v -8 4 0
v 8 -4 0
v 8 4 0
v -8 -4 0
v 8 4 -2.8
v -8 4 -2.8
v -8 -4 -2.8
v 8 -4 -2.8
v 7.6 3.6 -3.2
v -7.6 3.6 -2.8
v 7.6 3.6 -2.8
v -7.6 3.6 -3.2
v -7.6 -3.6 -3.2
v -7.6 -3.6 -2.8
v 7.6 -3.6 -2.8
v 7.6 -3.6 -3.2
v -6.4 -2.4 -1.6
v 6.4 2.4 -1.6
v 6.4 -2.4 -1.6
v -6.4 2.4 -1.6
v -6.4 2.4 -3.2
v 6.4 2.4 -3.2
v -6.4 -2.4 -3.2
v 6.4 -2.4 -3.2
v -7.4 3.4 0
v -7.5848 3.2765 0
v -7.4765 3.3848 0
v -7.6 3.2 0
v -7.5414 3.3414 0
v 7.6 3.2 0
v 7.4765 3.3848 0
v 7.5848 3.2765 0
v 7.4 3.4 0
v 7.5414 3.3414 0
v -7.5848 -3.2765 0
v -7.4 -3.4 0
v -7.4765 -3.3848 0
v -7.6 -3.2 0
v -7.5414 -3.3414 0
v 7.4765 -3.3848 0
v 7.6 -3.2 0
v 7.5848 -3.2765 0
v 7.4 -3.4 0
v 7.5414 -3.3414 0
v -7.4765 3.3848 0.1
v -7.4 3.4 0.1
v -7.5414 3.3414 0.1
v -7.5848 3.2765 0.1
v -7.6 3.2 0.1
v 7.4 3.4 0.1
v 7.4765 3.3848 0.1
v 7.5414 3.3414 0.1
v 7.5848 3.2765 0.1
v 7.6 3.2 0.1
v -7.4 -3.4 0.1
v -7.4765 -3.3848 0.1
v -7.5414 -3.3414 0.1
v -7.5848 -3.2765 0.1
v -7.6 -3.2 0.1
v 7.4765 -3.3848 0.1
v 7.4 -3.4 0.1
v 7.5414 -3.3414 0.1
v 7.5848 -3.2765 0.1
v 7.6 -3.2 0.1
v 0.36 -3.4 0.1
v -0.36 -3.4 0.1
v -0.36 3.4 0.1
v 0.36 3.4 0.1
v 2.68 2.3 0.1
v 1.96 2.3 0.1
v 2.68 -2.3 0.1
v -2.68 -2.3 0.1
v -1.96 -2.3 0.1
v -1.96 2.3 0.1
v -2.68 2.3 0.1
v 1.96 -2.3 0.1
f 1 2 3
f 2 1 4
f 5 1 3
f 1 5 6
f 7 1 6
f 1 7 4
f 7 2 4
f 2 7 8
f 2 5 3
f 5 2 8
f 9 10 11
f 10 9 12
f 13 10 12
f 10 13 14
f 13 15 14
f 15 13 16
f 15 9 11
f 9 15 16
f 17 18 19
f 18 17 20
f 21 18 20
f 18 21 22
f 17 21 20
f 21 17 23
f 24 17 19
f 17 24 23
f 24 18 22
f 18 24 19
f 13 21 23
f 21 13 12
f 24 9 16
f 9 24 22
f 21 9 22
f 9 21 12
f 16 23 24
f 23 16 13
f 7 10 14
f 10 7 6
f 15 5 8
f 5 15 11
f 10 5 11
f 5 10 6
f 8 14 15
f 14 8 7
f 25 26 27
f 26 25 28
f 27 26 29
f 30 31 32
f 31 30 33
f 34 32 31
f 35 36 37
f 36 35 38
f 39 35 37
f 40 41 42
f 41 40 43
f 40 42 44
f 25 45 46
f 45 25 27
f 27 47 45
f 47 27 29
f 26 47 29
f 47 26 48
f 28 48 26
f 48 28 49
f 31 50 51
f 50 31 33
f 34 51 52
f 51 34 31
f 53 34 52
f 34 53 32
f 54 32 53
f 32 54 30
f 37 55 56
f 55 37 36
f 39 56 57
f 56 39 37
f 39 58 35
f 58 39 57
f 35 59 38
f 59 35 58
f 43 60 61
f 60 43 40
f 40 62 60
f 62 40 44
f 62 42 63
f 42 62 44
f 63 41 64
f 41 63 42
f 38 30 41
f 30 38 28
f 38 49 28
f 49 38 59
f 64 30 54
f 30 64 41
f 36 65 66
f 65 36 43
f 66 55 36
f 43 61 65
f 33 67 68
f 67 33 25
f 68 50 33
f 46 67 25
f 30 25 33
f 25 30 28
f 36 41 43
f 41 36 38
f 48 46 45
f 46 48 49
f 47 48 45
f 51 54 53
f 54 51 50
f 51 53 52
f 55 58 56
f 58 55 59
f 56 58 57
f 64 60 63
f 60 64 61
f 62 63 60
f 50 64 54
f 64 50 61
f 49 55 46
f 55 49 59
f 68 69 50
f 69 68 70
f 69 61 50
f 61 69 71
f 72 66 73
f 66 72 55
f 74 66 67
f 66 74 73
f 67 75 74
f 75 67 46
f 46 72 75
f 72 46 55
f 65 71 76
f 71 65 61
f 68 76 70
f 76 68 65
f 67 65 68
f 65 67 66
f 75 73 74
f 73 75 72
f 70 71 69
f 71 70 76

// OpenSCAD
// file: ../p/box5.scad
use <../lib.scad>
function ldraw_lib__box5() = [
// 0 Box with 5 Faces and All Edges
// 0 Name: box5.dat
// 0 Author: James Jessiman
// 0 !LDRAW_ORG Primitive UPDATE 2012-01
// 0 !LICENSE Licensed under CC BY 4.0 : see CAreadme.txt
// 
// 0 BFC CERTIFY CCW
  [0,"BFC","CERTIFY"],
  [0,"BFC","CCW"],
// 
// 0 !HISTORY 2002-04-03 [sbliss] Modified for BFC compliance
// 0 !HISTORY 2002-04-25 [PTadmin] Official Update 2002-02
// 0 !HISTORY 2007-06-24 [PTadmin] Header formatted for Contributor Agreement
// 0 !HISTORY 2008-07-01 [PTadmin] Official Update 2008-01
// 0 !HISTORY 2012-02-16 [Philo] Changed to CCW
// 0 !HISTORY 2012-03-30 [PTadmin] Official Update 2012-01
// 
// 
// 2 24 1 1 1 -1 1 1
  [2,24,1,1,1,-1,1,1],
// 2 24 -1 1 1 -1 1 -1
  [2,24,-1,1,1,-1,1,-1],
// 2 24 -1 1 -1 1 1 -1
  [2,24,-1,1,-1,1,1,-1],
// 2 24 1 1 -1 1 1 1
  [2,24,1,1,-1,1,1,1],
// 2 24 1 0 1 -1 0 1
  [2,24,1,0,1,-1,0,1],
// 2 24 -1 0 1 -1 0 -1
  [2,24,-1,0,1,-1,0,-1],
// 2 24 -1 0 -1 1 0 -1
  [2,24,-1,0,-1,1,0,-1],
// 2 24 1 0 -1 1 0 1
  [2,24,1,0,-1,1,0,1],
// 2 24 1 0 1 1 1 1
  [2,24,1,0,1,1,1,1],
// 2 24 -1 0 1 -1 1 1
  [2,24,-1,0,1,-1,1,1],
// 2 24 1 0 -1 1 1 -1
  [2,24,1,0,-1,1,1,-1],
// 2 24 -1 0 -1 -1 1 -1
  [2,24,-1,0,-1,-1,1,-1],
// 4 16 -1 1 1 1 1 1 1 1 -1 -1 1 -1
  [4,16,-1,1,1,1,1,1,1,1,-1,-1,1,-1],
// 4 16 -1 1 1 -1 0 1 1 0 1 1 1 1
  [4,16,-1,1,1,-1,0,1,1,0,1,1,1,1],
// 4 16 -1 1 -1 -1 0 -1 -1 0 1 -1 1 1
  [4,16,-1,1,-1,-1,0,-1,-1,0,1,-1,1,1],
// 4 16 1 1 -1 1 0 -1 -1 0 -1 -1 1 -1
  [4,16,1,1,-1,1,0,-1,-1,0,-1,-1,1,-1],
// 4 16 1 1 1 1 0 1 1 0 -1 1 1 -1
  [4,16,1,1,1,1,0,1,1,0,-1,1,1,-1],
];
module ldraw_lib__box5(step=0, col=false, unit=2/5, alt=false, line=0.2, solid=!$preview)
    makepoly(ldraw_lib__box5(), step=step, col=col, unit=unit, alt=alt, line=line, solid=solid);
ldraw_lib__box5(line=0.2);
// file: ../p/box4.scad
use <../lib.scad>
function ldraw_lib__box4() = [
// 0 Box with 4 Faces (2 Parallel Pairs) and All Edges
// 0 Name: box4.dat
// 0 Author: James Jessiman
// 0 !LDRAW_ORG Primitive UPDATE 2012-01
// 0 !LICENSE Licensed under CC BY 4.0 : see CAreadme.txt
// 
// 0 BFC CERTIFY CCW
  [0,"BFC","CERTIFY"],
  [0,"BFC","CCW"],
// 
// 0 !HISTORY 2002-04-03 [sbliss] Modified for BFC compliance
// 0 !HISTORY 2002-04-25 [PTadmin] Official Update 2002-02
// 0 !HISTORY 2007-06-24 [PTadmin] Header formatted for Contributor Agreement
// 0 !HISTORY 2008-07-01 [PTadmin] Official Update 2008-01
// 0 !HISTORY 2012-02-16 [Philo] Changed to CCW
// 0 !HISTORY 2012-03-30 [PTadmin] Official Update 2012-01
// 
// 
// 2 24 1 1 1 -1 1 1
  [2,24,1,1,1,-1,1,1],
// 2 24 -1 1 1 -1 1 -1
  [2,24,-1,1,1,-1,1,-1],
// 2 24 -1 1 -1 1 1 -1
  [2,24,-1,1,-1,1,1,-1],
// 2 24 1 1 -1 1 1 1
  [2,24,1,1,-1,1,1,1],
// 2 24 1 0 1 -1 0 1
  [2,24,1,0,1,-1,0,1],
// 2 24 -1 0 1 -1 0 -1
  [2,24,-1,0,1,-1,0,-1],
// 2 24 -1 0 -1 1 0 -1
  [2,24,-1,0,-1,1,0,-1],
// 2 24 1 0 -1 1 0 1
  [2,24,1,0,-1,1,0,1],
// 2 24 1 0 1 1 1 1
  [2,24,1,0,1,1,1,1],
// 2 24 -1 0 1 -1 1 1
  [2,24,-1,0,1,-1,1,1],
// 2 24 1 0 -1 1 1 -1
  [2,24,1,0,-1,1,1,-1],
// 2 24 -1 0 -1 -1 1 -1
  [2,24,-1,0,-1,-1,1,-1],
// 4 16 -1 1 1 -1 0 1 1 0 1 1 1 1
  [4,16,-1,1,1,-1,0,1,1,0,1,1,1,1],
// 4 16 -1 1 -1 -1 0 -1 -1 0 1 -1 1 1
  [4,16,-1,1,-1,-1,0,-1,-1,0,1,-1,1,1],
// 4 16 1 1 -1 1 0 -1 -1 0 -1 -1 1 -1
  [4,16,1,1,-1,1,0,-1,-1,0,-1,-1,1,-1],
// 4 16 1 1 1 1 0 1 1 0 -1 1 1 -1
  [4,16,1,1,1,1,0,1,1,0,-1,1,1,-1],
];
module ldraw_lib__box4(step=0, col=false, unit=2/5, alt=false, line=0.2, solid=!$preview)
    makepoly(ldraw_lib__box4(), step=step, col=col, unit=unit, alt=alt, line=line, solid=solid);
ldraw_lib__box4(line=0.2);
// file: ../p/box3u12.scad
use <../lib.scad>
function ldraw_lib__box3u12() = [
// 0 Box with 3 Parallel Faces without Any Edges
// 0 Name: box3u12.dat
// 0 Author: J.C. Tchang [tchang]
// 0 !LDRAW_ORG Primitive UPDATE 2014-02
// 0 !LICENSE Licensed under CC BY 4.0 : see CAreadme.txt
// 
// 0 BFC CERTIFY CCW
  [0,"BFC","CERTIFY"],
  [0,"BFC","CCW"],
// 
// 0 !HISTORY 2014-12-23 [PTadmin] Official Update 2014-02
// 
// 
// 4 16 -1 1 1 1 1 1 1 1 -1 -1 1 -1
  [4,16,-1,1,1,1,1,1,1,1,-1,-1,1,-1],
// 4 16 -1 1 1 -1 0 1 1 0 1 1 1 1
  [4,16,-1,1,1,-1,0,1,1,0,1,1,1,1],
// 4 16 1 1 -1 1 0 -1 -1 0 -1 -1 1 -1
  [4,16,1,1,-1,1,0,-1,-1,0,-1,-1,1,-1],
];
module ldraw_lib__box3u12(step=0, col=false, unit=2/5, alt=false, line=0.2, solid=!$preview)
    makepoly(ldraw_lib__box3u12(), step=step, col=col, unit=unit, alt=alt, line=line, solid=solid);
ldraw_lib__box3u12(line=0.2);
// file: ../p/1-4cyli.scad
use <../lib.scad>
function ldraw_lib__1_4cyli() = [
// 0 Cylinder 0.25
// 0 Name: 1-4cyli.dat
// 0 Author: James Jessiman
// 0 !LDRAW_ORG Primitive UPDATE 2012-01
// 0 !LICENSE Licensed under CC BY 4.0 : see CAreadme.txt
// 
// 0 BFC CERTIFY CCW
  [0,"BFC","CERTIFY"],
  [0,"BFC","CCW"],
// 
// 0 !HISTORY 2002-03-23 [sbliss] Added BFC statement.
// 0 !HISTORY 2002-04-25 [PTadmin] Official Update 2002-02
// 0 !HISTORY 2007-06-22 [PTadmin] Header formatted for Contributor Agreement
// 0 !HISTORY 2008-07-01 [PTadmin] Official Update 2008-01
// 0 !HISTORY 2012-02-16 [Philo] Changed to CCW
// 0 !HISTORY 2012-03-30 [PTadmin] Official Update 2012-01
// 
// 
// 4 16 1 1 0 0.9239 1 0.3827 0.9239 0 0.3827 1 0 0
  [4,16,1,1,0,0.9239,1,0.3827,0.9239,0,0.3827,1,0,0],
// 5 24 1 0 0 1 1 0 0.9239 0 0.3827 1 0 -1
  [5,24,1,0,0,1,1,0,0.9239,0,0.3827,1,0,-1],
// 4 16 0.9239 1 0.3827 0.7071 1 0.7071 0.7071 0 0.7071 0.9239 0 0.3827
  [4,16,0.9239,1,0.3827,0.7071,1,0.7071,0.7071,0,0.7071,0.9239,0,0.3827],
// 5 24 0.9239 0 0.3827 0.9239 1 0.3827 0.7071 0 0.7071 1 0 0
  [5,24,0.9239,0,0.3827,0.9239,1,0.3827,0.7071,0,0.7071,1,0,0],
// 4 16 0.7071 1 0.7071 0.3827 1 0.9239 0.3827 0 0.9239 0.7071 0 0.7071
  [4,16,0.7071,1,0.7071,0.3827,1,0.9239,0.3827,0,0.9239,0.7071,0,0.7071],
// 5 24 0.7071 0 0.7071 0.7071 1 0.7071 0.3827 0 0.9239 0.9239 0 0.3827
  [5,24,0.7071,0,0.7071,0.7071,1,0.7071,0.3827,0,0.9239,0.9239,0,0.3827],
// 4 16 0.3827 1 0.9239 0 1 1 0 0 1 0.3827 0 0.9239
  [4,16,0.3827,1,0.9239,0,1,1,0,0,1,0.3827,0,0.9239],
// 5 24 0.3827 0 0.9239 0.3827 1 0.9239 0 0 1 0.7071 0 0.7071
  [5,24,0.3827,0,0.9239,0.3827,1,0.9239,0,0,1,0.7071,0,0.7071],
// 5 24 0 0 1 0 1 1 0.3827 0 0.9239 -1 0 1
  [5,24,0,0,1,0,1,1,0.3827,0,0.9239,-1,0,1],
];
module ldraw_lib__1_4cyli(step=0, col=false, unit=2/5, alt=false, line=0.2, solid=!$preview)
    makepoly(ldraw_lib__1_4cyli(), step=step, col=col, unit=unit, alt=alt, line=line, solid=solid);
ldraw_lib__1_4cyli(line=0.2);
// file: ../p/1-4chrd.scad
use <../lib.scad>
function ldraw_lib__1_4chrd() = [
// 0 Chord 0.25
// 0 Name: 1-4chrd.dat
// 0 Author: Max Martin Richter [MMR1988]
// 0 !LDRAW_ORG Primitive UPDATE 2023-05
// 0 !LICENSE Licensed under CC BY 4.0 : see CAreadme.txt
// 
// 0 BFC CERTIFY CCW
  [0,"BFC","CERTIFY"],
  [0,"BFC","CCW"],
// 
// 0 !HISTORY 2004-04-22 [PTadmin] Official Update 2004-02
// 0 !HISTORY 2007-10-09 [PTadmin] Header formatted for Contributor Agreement
// 0 !HISTORY 2008-07-01 [PTadmin] Official Update 2008-01
// 0 !HISTORY 2012-08-02 [MMR1988] Re-creation with PrimGen2 and Rectifier
// 0 !HISTORY 2012-08-09 [PTadmin] Official Update 2012-02
// 0 !HISTORY 2023-10-27 [OrionP] Change author to MMR1988 from hafhead
// 0 !HISTORY 2023-10-31 [OrionP] Official Update 2023-05
// 
// 4 16 0.9239 0 0.3827 0.3827 0 0.9239 0 0 1 1 0 0
  [4,16,0.9239,0,0.3827,0.3827,0,0.9239,0,0,1,1,0,0],
// 3 16 0.7071 0 0.7071 0.3827 0 0.9239 0.9239 0 0.3827
  [3,16,0.7071,0,0.7071,0.3827,0,0.9239,0.9239,0,0.3827],
];
module ldraw_lib__1_4chrd(step=0, col=false, unit=2/5, alt=false, line=0.2, solid=!$preview)
    makepoly(ldraw_lib__1_4chrd(), step=step, col=col, unit=unit, alt=alt, line=line, solid=solid);
ldraw_lib__1_4chrd(line=0.2);
// file: s/3069bs01.scad
use <../../lib.scad>
use <../../p/box4.scad>
use <../../p/box5.scad>
function ldraw_lib__s__3069bs01() = [
// 0 ~Tile  1 x  2 with Groove without Top Face
// 0 Name: s\3069bs01.dat
// 0 Author: Santeri Piippo [arezey]
// 0 !LDRAW_ORG Subpart UPDATE 2010-02
// 0 !LICENSE Licensed under CC BY 4.0 : see CAreadme.txt
// 
// 0 BFC CERTIFY CCW
  [0,"BFC","CERTIFY"],
  [0,"BFC","CCW"],
// 
// 0 !HISTORY 2010-07-05 [PTadmin] Official Update 2010-02
// 
// 
// 1 16 0 0 0 20 0 0 0 7 0 0 0 10 box4.dat
  [1,16,0,0,0,20,0,0,0,7,0,0,0,10, ldraw_lib__box4()],
// 1 16 0 7 0 19 0 0 0 1 0 0 0 9 box4.dat
  [1,16,0,7,0,19,0,0,0,1,0,0,0,9, ldraw_lib__box4()],
// 0 BFC INVERTNEXT
  [0,"BFC","INVERTNEXT"],
// 1 16 0 8 0 16 0 0 0 -4 0 0 0 6 box5.dat
  [1,16,0,8,0,16,0,0,0,-4,0,0,0,6, ldraw_lib__box5()],
// 4 16 -19 8 9 -16 8 6 -16 8 -6 -19 8 -9
  [4,16,-19,8,9,-16,8,6,-16,8,-6,-19,8,-9],
// 4 16 19 8 -9 16 8 -6 16 8 6 19 8 9
  [4,16,19,8,-9,16,8,-6,16,8,6,19,8,9],
// 4 16 19 8 9 16 8 6 -16 8 6 -19 8 9
  [4,16,19,8,9,16,8,6,-16,8,6,-19,8,9],
// 4 16 -19 8 -9 -16 8 -6 16 8 -6 19 8 -9
  [4,16,-19,8,-9,-16,8,-6,16,8,-6,19,8,-9],
// 4 16 -20 7 10 -19 7 9 -19 7 -9 -20 7 -10
  [4,16,-20,7,10,-19,7,9,-19,7,-9,-20,7,-10],
// 4 16 20 7 -10 19 7 -9 19 7 9 20 7 10
  [4,16,20,7,-10,19,7,-9,19,7,9,20,7,10],
// 4 16 20 7 10 19 7 9 -19 7 9 -20 7 10
  [4,16,20,7,10,19,7,9,-19,7,9,-20,7,10],
// 4 16 -20 7 -10 -19 7 -9 19 7 -9 20 7 -10
  [4,16,-20,7,-10,-19,7,-9,19,7,-9,20,7,-10],
// 0 //
];
module ldraw_lib__s__3069bs01(step=0, col=false, unit=2/5, alt=false, line=0.2, solid=!$preview)
    makepoly(ldraw_lib__s__3069bs01(), step=step, col=col, unit=unit, alt=alt, line=line, solid=solid);
ldraw_lib__s__3069bs01(line=0.2);
// file: 6451314h.scad
use <../lib.scad>
use <../p/1-4chrd.scad>
use <../p/1-4cyli.scad>
use <../p/box3u12.scad>
function ldraw_lib__6451314h() = [
// 0 Sticker  1.9 x  0.9 with Red, Metallic Silver and Blue Stripes on White Background
// 0 Name: 6451314h.dat
// 0 Author: Vincent Messenet [Cheenzo]
// 0 !LDRAW_ORG Part UPDATE 2024-07
// 0 !LICENSE Licensed under CC BY 4.0 : see CAreadme.txt
// 
// 0 BFC CERTIFY CCW
  [0,"BFC","CERTIFY"],
  [0,"BFC","CCW"],
// 
// 0 !KEYWORDS Bricklink 10321stk01, Brickowl 1314396, Chevrolet, Corvette, Icons
// 0 !KEYWORDS Rebrickable 10104784, Set 10321
// 
// 0 !HISTORY 2024-08-26 [OrionP] Official Update 2024-07
// 
// 1 16 8 0 18.5 .5 0 0 0 -1 0 0 0 .5 1-4chrd.dat
  [1,16,8,0,18.5,.5,0,0,0,-1,0,0,0,.5, ldraw_lib__1_4chrd()],
// 1 16 8 0 -18.5 .5 0 0 0 -1 0 0 0 -.5 1-4chrd.dat
  [1,16,8,0,-18.5,.5,0,0,0,-1,0,0,0,-.5, ldraw_lib__1_4chrd()],
// 1 16 -8 0 18.5 -.5 0 0 0 -1 0 0 0 .5 1-4chrd.dat
  [1,16,-8,0,18.5,-.5,0,0,0,-1,0,0,0,.5, ldraw_lib__1_4chrd()],
// 1 16 -8 0 -18.5 -.5 0 0 0 -1 0 0 0 -.5 1-4chrd.dat
  [1,16,-8,0,-18.5,-.5,0,0,0,-1,0,0,0,-.5, ldraw_lib__1_4chrd()],
// 1 16 8 0 18.5 .5 0 0 0 -.25 0 0 0 .5 1-4cyli.dat
  [1,16,8,0,18.5,.5,0,0,0,-.25,0,0,0,.5, ldraw_lib__1_4cyli()],
// 1 16 8 0 -18.5 .5 0 0 0 -.25 0 0 0 -.5 1-4cyli.dat
  [1,16,8,0,-18.5,.5,0,0,0,-.25,0,0,0,-.5, ldraw_lib__1_4cyli()],
// 1 16 -8 0 18.5 -.5 0 0 0 -.25 0 0 0 .5 1-4cyli.dat
  [1,16,-8,0,18.5,-.5,0,0,0,-.25,0,0,0,.5, ldraw_lib__1_4cyli()],
// 1 16 -8 0 -18.5 -.5 0 0 0 -.25 0 0 0 -.5 1-4cyli.dat
  [1,16,-8,0,-18.5,-.5,0,0,0,-.25,0,0,0,-.5, ldraw_lib__1_4cyli()],
// 1 16 0 -.25 0 8 0 0 0 .25 0 0 0 19 box3u12.dat
  [1,16,0,-.25,0,8,0,0,0,.25,0,0,0,19, ldraw_lib__box3u12()],
// 4 16 -8.5 -.25 .9 -8.5 0 18.5 -8.5 0 -18.5 -8.5 -.25 -.9
  [4,16,-8.5,-.25,.9,-8.5,0,18.5,-8.5,0,-18.5,-8.5,-.25,-.9],
// 3 16 -8.5 -.25 .9 -8.5 -.25 18.5 -8.5 0 18.5
  [3,16,-8.5,-.25,.9,-8.5,-.25,18.5,-8.5,0,18.5],
// 3 16 -8.5 0 -18.5 -8.5 -.25 -18.5 -8.5 -.25 -.9
  [3,16,-8.5,0,-18.5,-8.5,-.25,-18.5,-8.5,-.25,-.9],
// 4 16 8.5 0 18.5 8.5 -.25 .9 8.5 -.25 -.9 8.5 0 -18.5
  [4,16,8.5,0,18.5,8.5,-.25,.9,8.5,-.25,-.9,8.5,0,-18.5],
// 3 16 8.5 -.25 -.9 8.5 -.25 -18.5 8.5 0 -18.5
  [3,16,8.5,-.25,-.9,8.5,-.25,-18.5,8.5,0,-18.5],
// 3 16 8.5 -.25 18.5 8.5 -.25 .9 8.5 0 18.5
  [3,16,8.5,-.25,18.5,8.5,-.25,.9,8.5,0,18.5],
// 4 16 8.5 0 18.5 8.5 0 -18.5 8 0 -19 8 0 19
  [4,16,8.5,0,18.5,8.5,0,-18.5,8,0,-19,8,0,19],
// 4 16 -8.5 0 18.5 -8 0 19 -8 0 -19 -8.5 0 -18.5
  [4,16,-8.5,0,18.5,-8,0,19,-8,0,-19,-8.5,0,-18.5],
// 
// 1 15 8 -.25 18.5 .5 0 0 0 1 0 0 0 .5 1-4chrd.dat
  [1,15,8,-.25,18.5,.5,0,0,0,1,0,0,0,.5, ldraw_lib__1_4chrd()],
// 1 15 8 -.25 -18.5 .5 0 0 0 1 0 0 0 -.5 1-4chrd.dat
  [1,15,8,-.25,-18.5,.5,0,0,0,1,0,0,0,-.5, ldraw_lib__1_4chrd()],
// 1 15 -8 -.25 18.5 -.5 0 0 0 1 0 0 0 .5 1-4chrd.dat
  [1,15,-8,-.25,18.5,-.5,0,0,0,1,0,0,0,.5, ldraw_lib__1_4chrd()],
// 1 15 -8 -.25 -18.5 -.5 0 0 0 1 0 0 0 -.5 1-4chrd.dat
  [1,15,-8,-.25,-18.5,-.5,0,0,0,1,0,0,0,-.5, ldraw_lib__1_4chrd()],
// 4 15 8 -.25 -19 8.5 -.25 -18.5 -8.5 -.25 -18.5 -8 -.25 -19
  [4,15,8,-.25,-19,8.5,-.25,-18.5,-8.5,-.25,-18.5,-8,-.25,-19],
// 4 15 -8.5 -.25 18.5 8.5 -.25 18.5 8 -.25 19 -8 -.25 19
  [4,15,-8.5,-.25,18.5,8.5,-.25,18.5,8,-.25,19,-8,-.25,19],
// 4 15 8.5 -.25 -18.5 8.5 -.25 -.9 5.75 -.25 -4.9 5.75 -.25 -6.7
  [4,15,8.5,-.25,-18.5,8.5,-.25,-.9,5.75,-.25,-4.9,5.75,-.25,-6.7],
// 4 15 -8.5 -.25 -18.5 8.5 -.25 -18.5 5.75 -.25 -6.7 -5.75 -.25 -6.7
  [4,15,-8.5,-.25,-18.5,8.5,-.25,-18.5,5.75,-.25,-6.7,-5.75,-.25,-6.7],
// 4 15 -5.75 -.25 4.9 -5.75 -.25 6.7 -8.5 -.25 18.5 -8.5 -.25 .9
  [4,15,-5.75,-.25,4.9,-5.75,-.25,6.7,-8.5,-.25,18.5,-8.5,-.25,.9],
// 4 15 5.75 -.25 4.9 -5.75 -.25 4.9 -8.5 -.25 .9 8.5 -.25 .9
  [4,15,5.75,-.25,4.9,-5.75,-.25,4.9,-8.5,-.25,.9,8.5,-.25,.9],
// 4 15 5.75 -.25 4.9 8.5 -.25 .9 8.5 -.25 18.5 5.75 -.25 6.7
  [4,15,5.75,-.25,4.9,8.5,-.25,.9,8.5,-.25,18.5,5.75,-.25,6.7],
// 4 15 5.75 -.25 6.7 8.5 -.25 18.5 -8.5 -.25 18.5 -5.75 -.25 6.7
  [4,15,5.75,-.25,6.7,8.5,-.25,18.5,-8.5,-.25,18.5,-5.75,-.25,6.7],
// 4 15 -8.5 -.25 -18.5 -5.75 -.25 -6.7 -5.75 -.25 -4.9 -8.5 -.25 -.9
  [4,15,-8.5,-.25,-18.5,-5.75,-.25,-6.7,-5.75,-.25,-4.9,-8.5,-.25,-.9],
// 4 15 -8.5 -.25 -.9 -5.75 -.25 -4.9 5.75 -.25 -4.9 8.5 -.25 -.9
  [4,15,-8.5,-.25,-.9,-5.75,-.25,-4.9,5.75,-.25,-4.9,8.5,-.25,-.9],
// 4 80 -8.5 -.25 -.9 8.5 -.25 -.9 8.5 -.25 .9 -8.5 -.25 .9
  [4,80,-8.5,-.25,-.9,8.5,-.25,-.9,8.5,-.25,.9,-8.5,-.25,.9],
// 4 4 5.75 -.25 6.7 -5.75 -.25 6.7 -5.75 -.25 4.9 5.75 -.25 4.9
  [4,4,5.75,-.25,6.7,-5.75,-.25,6.7,-5.75,-.25,4.9,5.75,-.25,4.9],
// 4 1 -5.75 -.25 -6.7 5.75 -.25 -6.7 5.75 -.25 -4.9 -5.75 -.25 -4.9
  [4,1,-5.75,-.25,-6.7,5.75,-.25,-6.7,5.75,-.25,-4.9,-5.75,-.25,-4.9],
];
module ldraw_lib__6451314h(step=0, col=false, unit=2/5, alt=false, line=0.2, solid=!$preview)
    makepoly(ldraw_lib__6451314h(), step=step, col=col, unit=unit, alt=alt, line=line, solid=solid);
ldraw_lib__6451314h(line=0.2);
// file: 3069b.scad
use <../lib.scad>
use <s/3069bs01.scad>
function ldraw_lib__3069b() = [
// 0 Tile  1 x  2 with Groove
// 0 Name: 3069b.dat
// 0 Author: Santeri Piippo [arezey]
// 0 !LDRAW_ORG Part UPDATE 2010-02
// 0 !LICENSE Licensed under CC BY 4.0 : see CAreadme.txt
// 
// 0 BFC CERTIFY CCW
  [0,"BFC","CERTIFY"],
  [0,"BFC","CCW"],
// 
// 0 !KEYWORDS BrickLink 3069
// 
// 0 !HISTORY 2010-07-05 [PTadmin] Official Update 2010-02
// 
// 
// 4 16 20 0 -10 20 0 10 -20 0 10 -20 0 -10
  [4,16,20,0,-10,20,0,10,-20,0,10,-20,0,-10],
// 1 16 0 0 0 1 0 0 0 1 0 0 0 1 s\3069bs01.dat
  [1,16,0,0,0,1,0,0,0,1,0,0,0,1, ldraw_lib__s__3069bs01()],
// 0 //
];
module ldraw_lib__3069b(step=0, col=false, unit=2/5, alt=false, line=0.2, solid=!$preview)
    makepoly(ldraw_lib__3069b(), step=step, col=col, unit=unit, alt=alt, line=line, solid=solid);
ldraw_lib__3069b(line=0.2);
// main file
use <../lib.scad>
use <3069b.scad>
use <6451314h.scad>
function ldraw_lib__3069bd2g() = [
// 0 Tile  1 x  2 with Red, Metallic Silver and Blue Stripes on White Background Sticker
// 0 Name: 3069bd2g.dat
// 0 Author: Vincent Messenet [Cheenzo]
// 0 !LDRAW_ORG Shortcut UPDATE 2026-06
// 0 !LICENSE Licensed under CC BY 4.0 : see CAreadme.txt
// 
// 0 BFC CERTIFY CCW
  [0,"BFC","CERTIFY"],
  [0,"BFC","CCW"],
// 
// 0 !CATEGORY Sticker Shortcut
// 
// 0 !KEYWORDS Bricklink Chevrolet, Corvette, Icons, Set 10321
// 
// 0 !HISTORY 2026-06-28 [OrionP] Official Update 2026-06
// 
// 1 16 0 0 0 1 0 0 0 1 0 0 0 1 3069b.dat
  [1,16,0,0,0,1,0,0,0,1,0,0,0,1, ldraw_lib__3069b()],
// 1 16 0 0 0 0 0 -1 0 1 0 1 0 0 6451314h.dat
  [1,16,0,0,0,0,0,-1,0,1,0,1,0,0, ldraw_lib__6451314h()],
];
module ldraw_lib__3069bd2g(step=0, col=false, unit=2/5, alt=false, line=0.2, solid=!$preview)
    makepoly(ldraw_lib__3069bd2g(), step=step, col=col, unit=unit, alt=alt, line=line, solid=solid);
ldraw_lib__3069bd2g(line=0.2);
